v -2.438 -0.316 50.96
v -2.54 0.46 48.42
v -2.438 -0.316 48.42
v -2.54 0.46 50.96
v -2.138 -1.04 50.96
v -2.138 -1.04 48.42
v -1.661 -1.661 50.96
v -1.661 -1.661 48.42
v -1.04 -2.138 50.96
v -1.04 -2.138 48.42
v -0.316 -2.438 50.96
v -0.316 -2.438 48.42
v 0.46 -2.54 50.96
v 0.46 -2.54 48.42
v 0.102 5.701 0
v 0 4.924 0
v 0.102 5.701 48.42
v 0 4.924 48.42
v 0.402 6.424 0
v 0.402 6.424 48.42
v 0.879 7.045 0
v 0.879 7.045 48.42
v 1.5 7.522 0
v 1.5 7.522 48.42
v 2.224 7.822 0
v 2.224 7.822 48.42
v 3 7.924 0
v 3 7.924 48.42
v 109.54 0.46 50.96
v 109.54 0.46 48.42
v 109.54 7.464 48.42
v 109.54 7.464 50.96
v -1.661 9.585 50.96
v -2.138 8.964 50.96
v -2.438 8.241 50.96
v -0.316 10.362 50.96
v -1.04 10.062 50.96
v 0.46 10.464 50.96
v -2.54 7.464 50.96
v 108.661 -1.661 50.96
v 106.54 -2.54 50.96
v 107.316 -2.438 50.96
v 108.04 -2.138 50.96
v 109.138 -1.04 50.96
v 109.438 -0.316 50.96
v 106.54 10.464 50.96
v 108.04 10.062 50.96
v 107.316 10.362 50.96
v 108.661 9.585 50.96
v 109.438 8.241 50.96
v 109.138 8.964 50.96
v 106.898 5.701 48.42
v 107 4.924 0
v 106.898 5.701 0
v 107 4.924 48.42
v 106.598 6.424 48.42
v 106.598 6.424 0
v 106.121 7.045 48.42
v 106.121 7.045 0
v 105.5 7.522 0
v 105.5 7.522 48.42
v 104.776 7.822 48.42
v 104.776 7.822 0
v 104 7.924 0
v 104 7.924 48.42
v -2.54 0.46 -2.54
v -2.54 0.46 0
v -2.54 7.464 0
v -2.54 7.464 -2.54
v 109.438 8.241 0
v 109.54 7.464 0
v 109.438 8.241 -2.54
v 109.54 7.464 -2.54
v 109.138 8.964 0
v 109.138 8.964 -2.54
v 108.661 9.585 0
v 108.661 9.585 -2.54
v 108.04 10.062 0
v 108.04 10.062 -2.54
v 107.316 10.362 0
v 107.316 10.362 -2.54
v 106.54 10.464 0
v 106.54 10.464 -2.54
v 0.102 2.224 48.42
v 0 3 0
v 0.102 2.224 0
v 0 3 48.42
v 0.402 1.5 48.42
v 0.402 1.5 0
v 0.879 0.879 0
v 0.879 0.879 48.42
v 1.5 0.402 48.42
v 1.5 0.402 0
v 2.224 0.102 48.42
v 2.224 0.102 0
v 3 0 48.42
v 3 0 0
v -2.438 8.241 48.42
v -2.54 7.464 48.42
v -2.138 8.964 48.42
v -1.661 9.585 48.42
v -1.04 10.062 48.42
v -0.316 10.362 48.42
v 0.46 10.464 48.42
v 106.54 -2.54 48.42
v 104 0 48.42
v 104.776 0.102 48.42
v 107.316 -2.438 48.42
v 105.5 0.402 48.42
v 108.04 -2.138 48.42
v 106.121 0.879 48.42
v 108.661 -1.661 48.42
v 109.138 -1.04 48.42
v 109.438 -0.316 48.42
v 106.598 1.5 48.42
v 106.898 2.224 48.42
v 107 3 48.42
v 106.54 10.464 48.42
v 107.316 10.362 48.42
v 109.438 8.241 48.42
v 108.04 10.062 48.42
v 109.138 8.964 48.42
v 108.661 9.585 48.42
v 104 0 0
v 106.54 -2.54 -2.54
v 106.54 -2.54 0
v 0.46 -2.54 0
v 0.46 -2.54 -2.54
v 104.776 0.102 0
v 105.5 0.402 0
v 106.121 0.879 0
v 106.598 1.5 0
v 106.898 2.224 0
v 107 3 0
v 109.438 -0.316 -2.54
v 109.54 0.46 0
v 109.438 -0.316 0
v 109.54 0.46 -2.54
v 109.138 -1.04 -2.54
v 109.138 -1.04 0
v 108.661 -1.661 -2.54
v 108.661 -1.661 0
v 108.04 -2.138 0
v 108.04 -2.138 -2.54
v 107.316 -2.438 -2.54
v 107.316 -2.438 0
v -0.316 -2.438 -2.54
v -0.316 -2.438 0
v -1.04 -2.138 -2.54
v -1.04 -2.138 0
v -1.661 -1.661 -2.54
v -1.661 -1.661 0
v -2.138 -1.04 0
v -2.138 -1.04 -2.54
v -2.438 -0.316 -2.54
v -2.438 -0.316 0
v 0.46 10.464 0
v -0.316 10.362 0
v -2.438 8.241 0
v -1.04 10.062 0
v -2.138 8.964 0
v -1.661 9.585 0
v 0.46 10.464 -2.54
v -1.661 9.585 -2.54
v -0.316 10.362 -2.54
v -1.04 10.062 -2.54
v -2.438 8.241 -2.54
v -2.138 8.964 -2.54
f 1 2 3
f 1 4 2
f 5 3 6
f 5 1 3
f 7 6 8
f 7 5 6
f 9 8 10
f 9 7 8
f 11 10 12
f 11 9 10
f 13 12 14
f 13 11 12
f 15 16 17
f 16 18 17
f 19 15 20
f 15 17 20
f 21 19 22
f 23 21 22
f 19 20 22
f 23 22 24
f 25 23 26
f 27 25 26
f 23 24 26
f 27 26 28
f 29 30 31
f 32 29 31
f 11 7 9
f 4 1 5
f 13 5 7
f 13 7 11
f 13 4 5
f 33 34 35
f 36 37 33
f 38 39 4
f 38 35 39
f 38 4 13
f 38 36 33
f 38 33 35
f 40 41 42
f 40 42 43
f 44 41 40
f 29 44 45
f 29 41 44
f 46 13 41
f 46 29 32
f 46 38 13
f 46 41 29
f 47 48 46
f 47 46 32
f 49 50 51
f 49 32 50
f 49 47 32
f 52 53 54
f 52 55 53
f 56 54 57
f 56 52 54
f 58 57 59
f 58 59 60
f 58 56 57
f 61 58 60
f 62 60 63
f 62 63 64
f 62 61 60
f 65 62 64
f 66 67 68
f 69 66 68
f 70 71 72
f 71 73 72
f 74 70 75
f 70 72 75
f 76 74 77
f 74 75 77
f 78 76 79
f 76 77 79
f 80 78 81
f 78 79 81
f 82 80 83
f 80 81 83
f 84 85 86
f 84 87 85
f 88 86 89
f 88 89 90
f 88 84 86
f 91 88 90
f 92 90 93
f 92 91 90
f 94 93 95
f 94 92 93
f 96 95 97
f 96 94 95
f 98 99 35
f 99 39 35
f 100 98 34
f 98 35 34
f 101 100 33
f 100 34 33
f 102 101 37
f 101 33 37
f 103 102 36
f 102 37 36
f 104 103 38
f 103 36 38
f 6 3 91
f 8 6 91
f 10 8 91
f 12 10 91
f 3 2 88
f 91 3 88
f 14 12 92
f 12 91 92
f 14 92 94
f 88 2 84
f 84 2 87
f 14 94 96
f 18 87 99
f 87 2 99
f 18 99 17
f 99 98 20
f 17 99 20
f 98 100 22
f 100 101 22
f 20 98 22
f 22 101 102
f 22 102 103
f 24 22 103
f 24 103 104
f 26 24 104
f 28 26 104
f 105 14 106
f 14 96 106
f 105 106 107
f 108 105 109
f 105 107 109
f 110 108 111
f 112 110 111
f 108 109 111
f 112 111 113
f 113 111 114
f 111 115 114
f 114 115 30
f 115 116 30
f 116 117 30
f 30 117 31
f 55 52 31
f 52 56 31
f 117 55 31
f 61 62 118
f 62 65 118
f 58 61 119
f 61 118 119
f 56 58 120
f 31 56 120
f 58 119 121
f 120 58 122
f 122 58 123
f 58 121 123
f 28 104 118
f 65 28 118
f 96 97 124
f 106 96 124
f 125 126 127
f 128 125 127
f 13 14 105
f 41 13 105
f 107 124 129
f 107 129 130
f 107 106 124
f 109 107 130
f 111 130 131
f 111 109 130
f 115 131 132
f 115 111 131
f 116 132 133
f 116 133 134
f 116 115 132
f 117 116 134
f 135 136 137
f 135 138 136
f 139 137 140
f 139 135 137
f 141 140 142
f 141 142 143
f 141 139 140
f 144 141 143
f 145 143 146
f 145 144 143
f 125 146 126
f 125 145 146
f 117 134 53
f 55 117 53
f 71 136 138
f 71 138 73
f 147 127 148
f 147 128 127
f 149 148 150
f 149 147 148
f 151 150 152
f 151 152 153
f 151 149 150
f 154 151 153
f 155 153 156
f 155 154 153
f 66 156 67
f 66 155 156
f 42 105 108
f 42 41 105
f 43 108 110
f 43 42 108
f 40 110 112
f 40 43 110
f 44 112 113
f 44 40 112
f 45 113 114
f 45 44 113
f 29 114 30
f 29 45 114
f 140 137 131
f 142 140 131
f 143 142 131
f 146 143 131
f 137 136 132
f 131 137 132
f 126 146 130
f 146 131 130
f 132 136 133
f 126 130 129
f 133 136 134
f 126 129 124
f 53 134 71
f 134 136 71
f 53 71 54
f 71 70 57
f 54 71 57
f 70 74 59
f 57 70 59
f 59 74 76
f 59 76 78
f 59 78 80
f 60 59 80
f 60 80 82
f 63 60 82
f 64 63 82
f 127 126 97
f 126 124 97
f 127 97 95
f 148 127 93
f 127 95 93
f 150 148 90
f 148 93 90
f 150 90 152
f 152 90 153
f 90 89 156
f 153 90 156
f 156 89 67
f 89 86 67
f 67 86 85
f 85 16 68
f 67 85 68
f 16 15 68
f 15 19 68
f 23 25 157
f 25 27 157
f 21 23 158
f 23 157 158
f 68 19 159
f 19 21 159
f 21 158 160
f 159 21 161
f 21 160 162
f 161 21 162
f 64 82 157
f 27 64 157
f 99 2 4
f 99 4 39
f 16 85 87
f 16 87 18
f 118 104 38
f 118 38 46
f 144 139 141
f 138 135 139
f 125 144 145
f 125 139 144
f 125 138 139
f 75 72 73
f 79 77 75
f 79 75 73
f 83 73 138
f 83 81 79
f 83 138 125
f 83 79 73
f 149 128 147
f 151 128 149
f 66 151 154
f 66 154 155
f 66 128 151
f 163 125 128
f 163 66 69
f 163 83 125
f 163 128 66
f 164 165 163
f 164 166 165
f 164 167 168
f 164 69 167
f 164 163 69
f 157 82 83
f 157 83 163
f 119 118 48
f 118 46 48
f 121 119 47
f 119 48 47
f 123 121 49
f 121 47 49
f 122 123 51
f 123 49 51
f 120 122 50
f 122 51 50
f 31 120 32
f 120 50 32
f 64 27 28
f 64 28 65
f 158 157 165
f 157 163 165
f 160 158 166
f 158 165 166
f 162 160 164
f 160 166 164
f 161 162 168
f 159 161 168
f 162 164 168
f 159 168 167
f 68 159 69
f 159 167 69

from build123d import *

# Parameters (mm, degrees)
SKETCH2_W           = 107
SKETCH2_H           = 7.924066875
BOSS_EXTRUDE1_DEPTH = 48.42
FILLET1_R           = 3
SKETCH3_W           = 112.08
SKETCH3_H           = 13.004066875
BOSS_EXTRUDE2_DEPTH = 2.54
SKETCH4_W           = 112.08
SKETCH4_H           = 13.004066875
BOSS_EXTRUDE3_DEPTH = 2.54
FILLET2_R           = 3


with BuildPart() as part:
    # Sketch2 → Boss-Extrude1 (new body)
    with BuildSketch(Plane.XY):
        with Locations((53.5, 3.962033438)):
            Rectangle(SKETCH2_W, SKETCH2_H)
    extrude(amount=BOSS_EXTRUDE1_DEPTH)

    # Fillet1
    fillet1_edges = [part.edges().sort_by_distance(p)[0] for p in [
        (0, 0, 24.21),
        (0, 7.924066875, 24.21),
        (107, 7.924066875, 24.21),
        (107, 0, 24.21),
    ]]
    fillet(fillet1_edges, radius=FILLET1_R)

    # Sketch3 → Boss-Extrude2 (add)
    with BuildSketch(Plane.XY.offset(48.42)):
        with Locations((53.5, 3.962033438)):
            Rectangle(SKETCH3_W, SKETCH3_H)
    extrude(amount=BOSS_EXTRUDE2_DEPTH)

    # Sketch4 → Boss-Extrude3 (add)
    with BuildSketch(Plane(origin=(0, 0, 0), x_dir=(-1, 0, 0), z_dir=(0, 0, -1))):
        with Locations((-53.5, 3.962033438)):
            Rectangle(SKETCH4_W, SKETCH4_H)
    extrude(amount=BOSS_EXTRUDE3_DEPTH)

    # Fillet2
    fillet2_edges = [part.edges().sort_by_distance(p)[0] for p in [
        (-2.54, 10.464066875, 49.69),
        (-2.54, -2.54, 49.69),
        (109.54, -2.54, 49.69),
        (109.54, 10.464066875, 49.69),
        (109.54, 10.464066875, -1.27),
        (109.54, -2.54, -1.27),
        (-2.54, -2.54, -1.27),
        (-2.54, 10.464066875, -1.27),
    ]]
    fillet(fillet2_edges, radius=FILLET2_R)


solid = part.part
